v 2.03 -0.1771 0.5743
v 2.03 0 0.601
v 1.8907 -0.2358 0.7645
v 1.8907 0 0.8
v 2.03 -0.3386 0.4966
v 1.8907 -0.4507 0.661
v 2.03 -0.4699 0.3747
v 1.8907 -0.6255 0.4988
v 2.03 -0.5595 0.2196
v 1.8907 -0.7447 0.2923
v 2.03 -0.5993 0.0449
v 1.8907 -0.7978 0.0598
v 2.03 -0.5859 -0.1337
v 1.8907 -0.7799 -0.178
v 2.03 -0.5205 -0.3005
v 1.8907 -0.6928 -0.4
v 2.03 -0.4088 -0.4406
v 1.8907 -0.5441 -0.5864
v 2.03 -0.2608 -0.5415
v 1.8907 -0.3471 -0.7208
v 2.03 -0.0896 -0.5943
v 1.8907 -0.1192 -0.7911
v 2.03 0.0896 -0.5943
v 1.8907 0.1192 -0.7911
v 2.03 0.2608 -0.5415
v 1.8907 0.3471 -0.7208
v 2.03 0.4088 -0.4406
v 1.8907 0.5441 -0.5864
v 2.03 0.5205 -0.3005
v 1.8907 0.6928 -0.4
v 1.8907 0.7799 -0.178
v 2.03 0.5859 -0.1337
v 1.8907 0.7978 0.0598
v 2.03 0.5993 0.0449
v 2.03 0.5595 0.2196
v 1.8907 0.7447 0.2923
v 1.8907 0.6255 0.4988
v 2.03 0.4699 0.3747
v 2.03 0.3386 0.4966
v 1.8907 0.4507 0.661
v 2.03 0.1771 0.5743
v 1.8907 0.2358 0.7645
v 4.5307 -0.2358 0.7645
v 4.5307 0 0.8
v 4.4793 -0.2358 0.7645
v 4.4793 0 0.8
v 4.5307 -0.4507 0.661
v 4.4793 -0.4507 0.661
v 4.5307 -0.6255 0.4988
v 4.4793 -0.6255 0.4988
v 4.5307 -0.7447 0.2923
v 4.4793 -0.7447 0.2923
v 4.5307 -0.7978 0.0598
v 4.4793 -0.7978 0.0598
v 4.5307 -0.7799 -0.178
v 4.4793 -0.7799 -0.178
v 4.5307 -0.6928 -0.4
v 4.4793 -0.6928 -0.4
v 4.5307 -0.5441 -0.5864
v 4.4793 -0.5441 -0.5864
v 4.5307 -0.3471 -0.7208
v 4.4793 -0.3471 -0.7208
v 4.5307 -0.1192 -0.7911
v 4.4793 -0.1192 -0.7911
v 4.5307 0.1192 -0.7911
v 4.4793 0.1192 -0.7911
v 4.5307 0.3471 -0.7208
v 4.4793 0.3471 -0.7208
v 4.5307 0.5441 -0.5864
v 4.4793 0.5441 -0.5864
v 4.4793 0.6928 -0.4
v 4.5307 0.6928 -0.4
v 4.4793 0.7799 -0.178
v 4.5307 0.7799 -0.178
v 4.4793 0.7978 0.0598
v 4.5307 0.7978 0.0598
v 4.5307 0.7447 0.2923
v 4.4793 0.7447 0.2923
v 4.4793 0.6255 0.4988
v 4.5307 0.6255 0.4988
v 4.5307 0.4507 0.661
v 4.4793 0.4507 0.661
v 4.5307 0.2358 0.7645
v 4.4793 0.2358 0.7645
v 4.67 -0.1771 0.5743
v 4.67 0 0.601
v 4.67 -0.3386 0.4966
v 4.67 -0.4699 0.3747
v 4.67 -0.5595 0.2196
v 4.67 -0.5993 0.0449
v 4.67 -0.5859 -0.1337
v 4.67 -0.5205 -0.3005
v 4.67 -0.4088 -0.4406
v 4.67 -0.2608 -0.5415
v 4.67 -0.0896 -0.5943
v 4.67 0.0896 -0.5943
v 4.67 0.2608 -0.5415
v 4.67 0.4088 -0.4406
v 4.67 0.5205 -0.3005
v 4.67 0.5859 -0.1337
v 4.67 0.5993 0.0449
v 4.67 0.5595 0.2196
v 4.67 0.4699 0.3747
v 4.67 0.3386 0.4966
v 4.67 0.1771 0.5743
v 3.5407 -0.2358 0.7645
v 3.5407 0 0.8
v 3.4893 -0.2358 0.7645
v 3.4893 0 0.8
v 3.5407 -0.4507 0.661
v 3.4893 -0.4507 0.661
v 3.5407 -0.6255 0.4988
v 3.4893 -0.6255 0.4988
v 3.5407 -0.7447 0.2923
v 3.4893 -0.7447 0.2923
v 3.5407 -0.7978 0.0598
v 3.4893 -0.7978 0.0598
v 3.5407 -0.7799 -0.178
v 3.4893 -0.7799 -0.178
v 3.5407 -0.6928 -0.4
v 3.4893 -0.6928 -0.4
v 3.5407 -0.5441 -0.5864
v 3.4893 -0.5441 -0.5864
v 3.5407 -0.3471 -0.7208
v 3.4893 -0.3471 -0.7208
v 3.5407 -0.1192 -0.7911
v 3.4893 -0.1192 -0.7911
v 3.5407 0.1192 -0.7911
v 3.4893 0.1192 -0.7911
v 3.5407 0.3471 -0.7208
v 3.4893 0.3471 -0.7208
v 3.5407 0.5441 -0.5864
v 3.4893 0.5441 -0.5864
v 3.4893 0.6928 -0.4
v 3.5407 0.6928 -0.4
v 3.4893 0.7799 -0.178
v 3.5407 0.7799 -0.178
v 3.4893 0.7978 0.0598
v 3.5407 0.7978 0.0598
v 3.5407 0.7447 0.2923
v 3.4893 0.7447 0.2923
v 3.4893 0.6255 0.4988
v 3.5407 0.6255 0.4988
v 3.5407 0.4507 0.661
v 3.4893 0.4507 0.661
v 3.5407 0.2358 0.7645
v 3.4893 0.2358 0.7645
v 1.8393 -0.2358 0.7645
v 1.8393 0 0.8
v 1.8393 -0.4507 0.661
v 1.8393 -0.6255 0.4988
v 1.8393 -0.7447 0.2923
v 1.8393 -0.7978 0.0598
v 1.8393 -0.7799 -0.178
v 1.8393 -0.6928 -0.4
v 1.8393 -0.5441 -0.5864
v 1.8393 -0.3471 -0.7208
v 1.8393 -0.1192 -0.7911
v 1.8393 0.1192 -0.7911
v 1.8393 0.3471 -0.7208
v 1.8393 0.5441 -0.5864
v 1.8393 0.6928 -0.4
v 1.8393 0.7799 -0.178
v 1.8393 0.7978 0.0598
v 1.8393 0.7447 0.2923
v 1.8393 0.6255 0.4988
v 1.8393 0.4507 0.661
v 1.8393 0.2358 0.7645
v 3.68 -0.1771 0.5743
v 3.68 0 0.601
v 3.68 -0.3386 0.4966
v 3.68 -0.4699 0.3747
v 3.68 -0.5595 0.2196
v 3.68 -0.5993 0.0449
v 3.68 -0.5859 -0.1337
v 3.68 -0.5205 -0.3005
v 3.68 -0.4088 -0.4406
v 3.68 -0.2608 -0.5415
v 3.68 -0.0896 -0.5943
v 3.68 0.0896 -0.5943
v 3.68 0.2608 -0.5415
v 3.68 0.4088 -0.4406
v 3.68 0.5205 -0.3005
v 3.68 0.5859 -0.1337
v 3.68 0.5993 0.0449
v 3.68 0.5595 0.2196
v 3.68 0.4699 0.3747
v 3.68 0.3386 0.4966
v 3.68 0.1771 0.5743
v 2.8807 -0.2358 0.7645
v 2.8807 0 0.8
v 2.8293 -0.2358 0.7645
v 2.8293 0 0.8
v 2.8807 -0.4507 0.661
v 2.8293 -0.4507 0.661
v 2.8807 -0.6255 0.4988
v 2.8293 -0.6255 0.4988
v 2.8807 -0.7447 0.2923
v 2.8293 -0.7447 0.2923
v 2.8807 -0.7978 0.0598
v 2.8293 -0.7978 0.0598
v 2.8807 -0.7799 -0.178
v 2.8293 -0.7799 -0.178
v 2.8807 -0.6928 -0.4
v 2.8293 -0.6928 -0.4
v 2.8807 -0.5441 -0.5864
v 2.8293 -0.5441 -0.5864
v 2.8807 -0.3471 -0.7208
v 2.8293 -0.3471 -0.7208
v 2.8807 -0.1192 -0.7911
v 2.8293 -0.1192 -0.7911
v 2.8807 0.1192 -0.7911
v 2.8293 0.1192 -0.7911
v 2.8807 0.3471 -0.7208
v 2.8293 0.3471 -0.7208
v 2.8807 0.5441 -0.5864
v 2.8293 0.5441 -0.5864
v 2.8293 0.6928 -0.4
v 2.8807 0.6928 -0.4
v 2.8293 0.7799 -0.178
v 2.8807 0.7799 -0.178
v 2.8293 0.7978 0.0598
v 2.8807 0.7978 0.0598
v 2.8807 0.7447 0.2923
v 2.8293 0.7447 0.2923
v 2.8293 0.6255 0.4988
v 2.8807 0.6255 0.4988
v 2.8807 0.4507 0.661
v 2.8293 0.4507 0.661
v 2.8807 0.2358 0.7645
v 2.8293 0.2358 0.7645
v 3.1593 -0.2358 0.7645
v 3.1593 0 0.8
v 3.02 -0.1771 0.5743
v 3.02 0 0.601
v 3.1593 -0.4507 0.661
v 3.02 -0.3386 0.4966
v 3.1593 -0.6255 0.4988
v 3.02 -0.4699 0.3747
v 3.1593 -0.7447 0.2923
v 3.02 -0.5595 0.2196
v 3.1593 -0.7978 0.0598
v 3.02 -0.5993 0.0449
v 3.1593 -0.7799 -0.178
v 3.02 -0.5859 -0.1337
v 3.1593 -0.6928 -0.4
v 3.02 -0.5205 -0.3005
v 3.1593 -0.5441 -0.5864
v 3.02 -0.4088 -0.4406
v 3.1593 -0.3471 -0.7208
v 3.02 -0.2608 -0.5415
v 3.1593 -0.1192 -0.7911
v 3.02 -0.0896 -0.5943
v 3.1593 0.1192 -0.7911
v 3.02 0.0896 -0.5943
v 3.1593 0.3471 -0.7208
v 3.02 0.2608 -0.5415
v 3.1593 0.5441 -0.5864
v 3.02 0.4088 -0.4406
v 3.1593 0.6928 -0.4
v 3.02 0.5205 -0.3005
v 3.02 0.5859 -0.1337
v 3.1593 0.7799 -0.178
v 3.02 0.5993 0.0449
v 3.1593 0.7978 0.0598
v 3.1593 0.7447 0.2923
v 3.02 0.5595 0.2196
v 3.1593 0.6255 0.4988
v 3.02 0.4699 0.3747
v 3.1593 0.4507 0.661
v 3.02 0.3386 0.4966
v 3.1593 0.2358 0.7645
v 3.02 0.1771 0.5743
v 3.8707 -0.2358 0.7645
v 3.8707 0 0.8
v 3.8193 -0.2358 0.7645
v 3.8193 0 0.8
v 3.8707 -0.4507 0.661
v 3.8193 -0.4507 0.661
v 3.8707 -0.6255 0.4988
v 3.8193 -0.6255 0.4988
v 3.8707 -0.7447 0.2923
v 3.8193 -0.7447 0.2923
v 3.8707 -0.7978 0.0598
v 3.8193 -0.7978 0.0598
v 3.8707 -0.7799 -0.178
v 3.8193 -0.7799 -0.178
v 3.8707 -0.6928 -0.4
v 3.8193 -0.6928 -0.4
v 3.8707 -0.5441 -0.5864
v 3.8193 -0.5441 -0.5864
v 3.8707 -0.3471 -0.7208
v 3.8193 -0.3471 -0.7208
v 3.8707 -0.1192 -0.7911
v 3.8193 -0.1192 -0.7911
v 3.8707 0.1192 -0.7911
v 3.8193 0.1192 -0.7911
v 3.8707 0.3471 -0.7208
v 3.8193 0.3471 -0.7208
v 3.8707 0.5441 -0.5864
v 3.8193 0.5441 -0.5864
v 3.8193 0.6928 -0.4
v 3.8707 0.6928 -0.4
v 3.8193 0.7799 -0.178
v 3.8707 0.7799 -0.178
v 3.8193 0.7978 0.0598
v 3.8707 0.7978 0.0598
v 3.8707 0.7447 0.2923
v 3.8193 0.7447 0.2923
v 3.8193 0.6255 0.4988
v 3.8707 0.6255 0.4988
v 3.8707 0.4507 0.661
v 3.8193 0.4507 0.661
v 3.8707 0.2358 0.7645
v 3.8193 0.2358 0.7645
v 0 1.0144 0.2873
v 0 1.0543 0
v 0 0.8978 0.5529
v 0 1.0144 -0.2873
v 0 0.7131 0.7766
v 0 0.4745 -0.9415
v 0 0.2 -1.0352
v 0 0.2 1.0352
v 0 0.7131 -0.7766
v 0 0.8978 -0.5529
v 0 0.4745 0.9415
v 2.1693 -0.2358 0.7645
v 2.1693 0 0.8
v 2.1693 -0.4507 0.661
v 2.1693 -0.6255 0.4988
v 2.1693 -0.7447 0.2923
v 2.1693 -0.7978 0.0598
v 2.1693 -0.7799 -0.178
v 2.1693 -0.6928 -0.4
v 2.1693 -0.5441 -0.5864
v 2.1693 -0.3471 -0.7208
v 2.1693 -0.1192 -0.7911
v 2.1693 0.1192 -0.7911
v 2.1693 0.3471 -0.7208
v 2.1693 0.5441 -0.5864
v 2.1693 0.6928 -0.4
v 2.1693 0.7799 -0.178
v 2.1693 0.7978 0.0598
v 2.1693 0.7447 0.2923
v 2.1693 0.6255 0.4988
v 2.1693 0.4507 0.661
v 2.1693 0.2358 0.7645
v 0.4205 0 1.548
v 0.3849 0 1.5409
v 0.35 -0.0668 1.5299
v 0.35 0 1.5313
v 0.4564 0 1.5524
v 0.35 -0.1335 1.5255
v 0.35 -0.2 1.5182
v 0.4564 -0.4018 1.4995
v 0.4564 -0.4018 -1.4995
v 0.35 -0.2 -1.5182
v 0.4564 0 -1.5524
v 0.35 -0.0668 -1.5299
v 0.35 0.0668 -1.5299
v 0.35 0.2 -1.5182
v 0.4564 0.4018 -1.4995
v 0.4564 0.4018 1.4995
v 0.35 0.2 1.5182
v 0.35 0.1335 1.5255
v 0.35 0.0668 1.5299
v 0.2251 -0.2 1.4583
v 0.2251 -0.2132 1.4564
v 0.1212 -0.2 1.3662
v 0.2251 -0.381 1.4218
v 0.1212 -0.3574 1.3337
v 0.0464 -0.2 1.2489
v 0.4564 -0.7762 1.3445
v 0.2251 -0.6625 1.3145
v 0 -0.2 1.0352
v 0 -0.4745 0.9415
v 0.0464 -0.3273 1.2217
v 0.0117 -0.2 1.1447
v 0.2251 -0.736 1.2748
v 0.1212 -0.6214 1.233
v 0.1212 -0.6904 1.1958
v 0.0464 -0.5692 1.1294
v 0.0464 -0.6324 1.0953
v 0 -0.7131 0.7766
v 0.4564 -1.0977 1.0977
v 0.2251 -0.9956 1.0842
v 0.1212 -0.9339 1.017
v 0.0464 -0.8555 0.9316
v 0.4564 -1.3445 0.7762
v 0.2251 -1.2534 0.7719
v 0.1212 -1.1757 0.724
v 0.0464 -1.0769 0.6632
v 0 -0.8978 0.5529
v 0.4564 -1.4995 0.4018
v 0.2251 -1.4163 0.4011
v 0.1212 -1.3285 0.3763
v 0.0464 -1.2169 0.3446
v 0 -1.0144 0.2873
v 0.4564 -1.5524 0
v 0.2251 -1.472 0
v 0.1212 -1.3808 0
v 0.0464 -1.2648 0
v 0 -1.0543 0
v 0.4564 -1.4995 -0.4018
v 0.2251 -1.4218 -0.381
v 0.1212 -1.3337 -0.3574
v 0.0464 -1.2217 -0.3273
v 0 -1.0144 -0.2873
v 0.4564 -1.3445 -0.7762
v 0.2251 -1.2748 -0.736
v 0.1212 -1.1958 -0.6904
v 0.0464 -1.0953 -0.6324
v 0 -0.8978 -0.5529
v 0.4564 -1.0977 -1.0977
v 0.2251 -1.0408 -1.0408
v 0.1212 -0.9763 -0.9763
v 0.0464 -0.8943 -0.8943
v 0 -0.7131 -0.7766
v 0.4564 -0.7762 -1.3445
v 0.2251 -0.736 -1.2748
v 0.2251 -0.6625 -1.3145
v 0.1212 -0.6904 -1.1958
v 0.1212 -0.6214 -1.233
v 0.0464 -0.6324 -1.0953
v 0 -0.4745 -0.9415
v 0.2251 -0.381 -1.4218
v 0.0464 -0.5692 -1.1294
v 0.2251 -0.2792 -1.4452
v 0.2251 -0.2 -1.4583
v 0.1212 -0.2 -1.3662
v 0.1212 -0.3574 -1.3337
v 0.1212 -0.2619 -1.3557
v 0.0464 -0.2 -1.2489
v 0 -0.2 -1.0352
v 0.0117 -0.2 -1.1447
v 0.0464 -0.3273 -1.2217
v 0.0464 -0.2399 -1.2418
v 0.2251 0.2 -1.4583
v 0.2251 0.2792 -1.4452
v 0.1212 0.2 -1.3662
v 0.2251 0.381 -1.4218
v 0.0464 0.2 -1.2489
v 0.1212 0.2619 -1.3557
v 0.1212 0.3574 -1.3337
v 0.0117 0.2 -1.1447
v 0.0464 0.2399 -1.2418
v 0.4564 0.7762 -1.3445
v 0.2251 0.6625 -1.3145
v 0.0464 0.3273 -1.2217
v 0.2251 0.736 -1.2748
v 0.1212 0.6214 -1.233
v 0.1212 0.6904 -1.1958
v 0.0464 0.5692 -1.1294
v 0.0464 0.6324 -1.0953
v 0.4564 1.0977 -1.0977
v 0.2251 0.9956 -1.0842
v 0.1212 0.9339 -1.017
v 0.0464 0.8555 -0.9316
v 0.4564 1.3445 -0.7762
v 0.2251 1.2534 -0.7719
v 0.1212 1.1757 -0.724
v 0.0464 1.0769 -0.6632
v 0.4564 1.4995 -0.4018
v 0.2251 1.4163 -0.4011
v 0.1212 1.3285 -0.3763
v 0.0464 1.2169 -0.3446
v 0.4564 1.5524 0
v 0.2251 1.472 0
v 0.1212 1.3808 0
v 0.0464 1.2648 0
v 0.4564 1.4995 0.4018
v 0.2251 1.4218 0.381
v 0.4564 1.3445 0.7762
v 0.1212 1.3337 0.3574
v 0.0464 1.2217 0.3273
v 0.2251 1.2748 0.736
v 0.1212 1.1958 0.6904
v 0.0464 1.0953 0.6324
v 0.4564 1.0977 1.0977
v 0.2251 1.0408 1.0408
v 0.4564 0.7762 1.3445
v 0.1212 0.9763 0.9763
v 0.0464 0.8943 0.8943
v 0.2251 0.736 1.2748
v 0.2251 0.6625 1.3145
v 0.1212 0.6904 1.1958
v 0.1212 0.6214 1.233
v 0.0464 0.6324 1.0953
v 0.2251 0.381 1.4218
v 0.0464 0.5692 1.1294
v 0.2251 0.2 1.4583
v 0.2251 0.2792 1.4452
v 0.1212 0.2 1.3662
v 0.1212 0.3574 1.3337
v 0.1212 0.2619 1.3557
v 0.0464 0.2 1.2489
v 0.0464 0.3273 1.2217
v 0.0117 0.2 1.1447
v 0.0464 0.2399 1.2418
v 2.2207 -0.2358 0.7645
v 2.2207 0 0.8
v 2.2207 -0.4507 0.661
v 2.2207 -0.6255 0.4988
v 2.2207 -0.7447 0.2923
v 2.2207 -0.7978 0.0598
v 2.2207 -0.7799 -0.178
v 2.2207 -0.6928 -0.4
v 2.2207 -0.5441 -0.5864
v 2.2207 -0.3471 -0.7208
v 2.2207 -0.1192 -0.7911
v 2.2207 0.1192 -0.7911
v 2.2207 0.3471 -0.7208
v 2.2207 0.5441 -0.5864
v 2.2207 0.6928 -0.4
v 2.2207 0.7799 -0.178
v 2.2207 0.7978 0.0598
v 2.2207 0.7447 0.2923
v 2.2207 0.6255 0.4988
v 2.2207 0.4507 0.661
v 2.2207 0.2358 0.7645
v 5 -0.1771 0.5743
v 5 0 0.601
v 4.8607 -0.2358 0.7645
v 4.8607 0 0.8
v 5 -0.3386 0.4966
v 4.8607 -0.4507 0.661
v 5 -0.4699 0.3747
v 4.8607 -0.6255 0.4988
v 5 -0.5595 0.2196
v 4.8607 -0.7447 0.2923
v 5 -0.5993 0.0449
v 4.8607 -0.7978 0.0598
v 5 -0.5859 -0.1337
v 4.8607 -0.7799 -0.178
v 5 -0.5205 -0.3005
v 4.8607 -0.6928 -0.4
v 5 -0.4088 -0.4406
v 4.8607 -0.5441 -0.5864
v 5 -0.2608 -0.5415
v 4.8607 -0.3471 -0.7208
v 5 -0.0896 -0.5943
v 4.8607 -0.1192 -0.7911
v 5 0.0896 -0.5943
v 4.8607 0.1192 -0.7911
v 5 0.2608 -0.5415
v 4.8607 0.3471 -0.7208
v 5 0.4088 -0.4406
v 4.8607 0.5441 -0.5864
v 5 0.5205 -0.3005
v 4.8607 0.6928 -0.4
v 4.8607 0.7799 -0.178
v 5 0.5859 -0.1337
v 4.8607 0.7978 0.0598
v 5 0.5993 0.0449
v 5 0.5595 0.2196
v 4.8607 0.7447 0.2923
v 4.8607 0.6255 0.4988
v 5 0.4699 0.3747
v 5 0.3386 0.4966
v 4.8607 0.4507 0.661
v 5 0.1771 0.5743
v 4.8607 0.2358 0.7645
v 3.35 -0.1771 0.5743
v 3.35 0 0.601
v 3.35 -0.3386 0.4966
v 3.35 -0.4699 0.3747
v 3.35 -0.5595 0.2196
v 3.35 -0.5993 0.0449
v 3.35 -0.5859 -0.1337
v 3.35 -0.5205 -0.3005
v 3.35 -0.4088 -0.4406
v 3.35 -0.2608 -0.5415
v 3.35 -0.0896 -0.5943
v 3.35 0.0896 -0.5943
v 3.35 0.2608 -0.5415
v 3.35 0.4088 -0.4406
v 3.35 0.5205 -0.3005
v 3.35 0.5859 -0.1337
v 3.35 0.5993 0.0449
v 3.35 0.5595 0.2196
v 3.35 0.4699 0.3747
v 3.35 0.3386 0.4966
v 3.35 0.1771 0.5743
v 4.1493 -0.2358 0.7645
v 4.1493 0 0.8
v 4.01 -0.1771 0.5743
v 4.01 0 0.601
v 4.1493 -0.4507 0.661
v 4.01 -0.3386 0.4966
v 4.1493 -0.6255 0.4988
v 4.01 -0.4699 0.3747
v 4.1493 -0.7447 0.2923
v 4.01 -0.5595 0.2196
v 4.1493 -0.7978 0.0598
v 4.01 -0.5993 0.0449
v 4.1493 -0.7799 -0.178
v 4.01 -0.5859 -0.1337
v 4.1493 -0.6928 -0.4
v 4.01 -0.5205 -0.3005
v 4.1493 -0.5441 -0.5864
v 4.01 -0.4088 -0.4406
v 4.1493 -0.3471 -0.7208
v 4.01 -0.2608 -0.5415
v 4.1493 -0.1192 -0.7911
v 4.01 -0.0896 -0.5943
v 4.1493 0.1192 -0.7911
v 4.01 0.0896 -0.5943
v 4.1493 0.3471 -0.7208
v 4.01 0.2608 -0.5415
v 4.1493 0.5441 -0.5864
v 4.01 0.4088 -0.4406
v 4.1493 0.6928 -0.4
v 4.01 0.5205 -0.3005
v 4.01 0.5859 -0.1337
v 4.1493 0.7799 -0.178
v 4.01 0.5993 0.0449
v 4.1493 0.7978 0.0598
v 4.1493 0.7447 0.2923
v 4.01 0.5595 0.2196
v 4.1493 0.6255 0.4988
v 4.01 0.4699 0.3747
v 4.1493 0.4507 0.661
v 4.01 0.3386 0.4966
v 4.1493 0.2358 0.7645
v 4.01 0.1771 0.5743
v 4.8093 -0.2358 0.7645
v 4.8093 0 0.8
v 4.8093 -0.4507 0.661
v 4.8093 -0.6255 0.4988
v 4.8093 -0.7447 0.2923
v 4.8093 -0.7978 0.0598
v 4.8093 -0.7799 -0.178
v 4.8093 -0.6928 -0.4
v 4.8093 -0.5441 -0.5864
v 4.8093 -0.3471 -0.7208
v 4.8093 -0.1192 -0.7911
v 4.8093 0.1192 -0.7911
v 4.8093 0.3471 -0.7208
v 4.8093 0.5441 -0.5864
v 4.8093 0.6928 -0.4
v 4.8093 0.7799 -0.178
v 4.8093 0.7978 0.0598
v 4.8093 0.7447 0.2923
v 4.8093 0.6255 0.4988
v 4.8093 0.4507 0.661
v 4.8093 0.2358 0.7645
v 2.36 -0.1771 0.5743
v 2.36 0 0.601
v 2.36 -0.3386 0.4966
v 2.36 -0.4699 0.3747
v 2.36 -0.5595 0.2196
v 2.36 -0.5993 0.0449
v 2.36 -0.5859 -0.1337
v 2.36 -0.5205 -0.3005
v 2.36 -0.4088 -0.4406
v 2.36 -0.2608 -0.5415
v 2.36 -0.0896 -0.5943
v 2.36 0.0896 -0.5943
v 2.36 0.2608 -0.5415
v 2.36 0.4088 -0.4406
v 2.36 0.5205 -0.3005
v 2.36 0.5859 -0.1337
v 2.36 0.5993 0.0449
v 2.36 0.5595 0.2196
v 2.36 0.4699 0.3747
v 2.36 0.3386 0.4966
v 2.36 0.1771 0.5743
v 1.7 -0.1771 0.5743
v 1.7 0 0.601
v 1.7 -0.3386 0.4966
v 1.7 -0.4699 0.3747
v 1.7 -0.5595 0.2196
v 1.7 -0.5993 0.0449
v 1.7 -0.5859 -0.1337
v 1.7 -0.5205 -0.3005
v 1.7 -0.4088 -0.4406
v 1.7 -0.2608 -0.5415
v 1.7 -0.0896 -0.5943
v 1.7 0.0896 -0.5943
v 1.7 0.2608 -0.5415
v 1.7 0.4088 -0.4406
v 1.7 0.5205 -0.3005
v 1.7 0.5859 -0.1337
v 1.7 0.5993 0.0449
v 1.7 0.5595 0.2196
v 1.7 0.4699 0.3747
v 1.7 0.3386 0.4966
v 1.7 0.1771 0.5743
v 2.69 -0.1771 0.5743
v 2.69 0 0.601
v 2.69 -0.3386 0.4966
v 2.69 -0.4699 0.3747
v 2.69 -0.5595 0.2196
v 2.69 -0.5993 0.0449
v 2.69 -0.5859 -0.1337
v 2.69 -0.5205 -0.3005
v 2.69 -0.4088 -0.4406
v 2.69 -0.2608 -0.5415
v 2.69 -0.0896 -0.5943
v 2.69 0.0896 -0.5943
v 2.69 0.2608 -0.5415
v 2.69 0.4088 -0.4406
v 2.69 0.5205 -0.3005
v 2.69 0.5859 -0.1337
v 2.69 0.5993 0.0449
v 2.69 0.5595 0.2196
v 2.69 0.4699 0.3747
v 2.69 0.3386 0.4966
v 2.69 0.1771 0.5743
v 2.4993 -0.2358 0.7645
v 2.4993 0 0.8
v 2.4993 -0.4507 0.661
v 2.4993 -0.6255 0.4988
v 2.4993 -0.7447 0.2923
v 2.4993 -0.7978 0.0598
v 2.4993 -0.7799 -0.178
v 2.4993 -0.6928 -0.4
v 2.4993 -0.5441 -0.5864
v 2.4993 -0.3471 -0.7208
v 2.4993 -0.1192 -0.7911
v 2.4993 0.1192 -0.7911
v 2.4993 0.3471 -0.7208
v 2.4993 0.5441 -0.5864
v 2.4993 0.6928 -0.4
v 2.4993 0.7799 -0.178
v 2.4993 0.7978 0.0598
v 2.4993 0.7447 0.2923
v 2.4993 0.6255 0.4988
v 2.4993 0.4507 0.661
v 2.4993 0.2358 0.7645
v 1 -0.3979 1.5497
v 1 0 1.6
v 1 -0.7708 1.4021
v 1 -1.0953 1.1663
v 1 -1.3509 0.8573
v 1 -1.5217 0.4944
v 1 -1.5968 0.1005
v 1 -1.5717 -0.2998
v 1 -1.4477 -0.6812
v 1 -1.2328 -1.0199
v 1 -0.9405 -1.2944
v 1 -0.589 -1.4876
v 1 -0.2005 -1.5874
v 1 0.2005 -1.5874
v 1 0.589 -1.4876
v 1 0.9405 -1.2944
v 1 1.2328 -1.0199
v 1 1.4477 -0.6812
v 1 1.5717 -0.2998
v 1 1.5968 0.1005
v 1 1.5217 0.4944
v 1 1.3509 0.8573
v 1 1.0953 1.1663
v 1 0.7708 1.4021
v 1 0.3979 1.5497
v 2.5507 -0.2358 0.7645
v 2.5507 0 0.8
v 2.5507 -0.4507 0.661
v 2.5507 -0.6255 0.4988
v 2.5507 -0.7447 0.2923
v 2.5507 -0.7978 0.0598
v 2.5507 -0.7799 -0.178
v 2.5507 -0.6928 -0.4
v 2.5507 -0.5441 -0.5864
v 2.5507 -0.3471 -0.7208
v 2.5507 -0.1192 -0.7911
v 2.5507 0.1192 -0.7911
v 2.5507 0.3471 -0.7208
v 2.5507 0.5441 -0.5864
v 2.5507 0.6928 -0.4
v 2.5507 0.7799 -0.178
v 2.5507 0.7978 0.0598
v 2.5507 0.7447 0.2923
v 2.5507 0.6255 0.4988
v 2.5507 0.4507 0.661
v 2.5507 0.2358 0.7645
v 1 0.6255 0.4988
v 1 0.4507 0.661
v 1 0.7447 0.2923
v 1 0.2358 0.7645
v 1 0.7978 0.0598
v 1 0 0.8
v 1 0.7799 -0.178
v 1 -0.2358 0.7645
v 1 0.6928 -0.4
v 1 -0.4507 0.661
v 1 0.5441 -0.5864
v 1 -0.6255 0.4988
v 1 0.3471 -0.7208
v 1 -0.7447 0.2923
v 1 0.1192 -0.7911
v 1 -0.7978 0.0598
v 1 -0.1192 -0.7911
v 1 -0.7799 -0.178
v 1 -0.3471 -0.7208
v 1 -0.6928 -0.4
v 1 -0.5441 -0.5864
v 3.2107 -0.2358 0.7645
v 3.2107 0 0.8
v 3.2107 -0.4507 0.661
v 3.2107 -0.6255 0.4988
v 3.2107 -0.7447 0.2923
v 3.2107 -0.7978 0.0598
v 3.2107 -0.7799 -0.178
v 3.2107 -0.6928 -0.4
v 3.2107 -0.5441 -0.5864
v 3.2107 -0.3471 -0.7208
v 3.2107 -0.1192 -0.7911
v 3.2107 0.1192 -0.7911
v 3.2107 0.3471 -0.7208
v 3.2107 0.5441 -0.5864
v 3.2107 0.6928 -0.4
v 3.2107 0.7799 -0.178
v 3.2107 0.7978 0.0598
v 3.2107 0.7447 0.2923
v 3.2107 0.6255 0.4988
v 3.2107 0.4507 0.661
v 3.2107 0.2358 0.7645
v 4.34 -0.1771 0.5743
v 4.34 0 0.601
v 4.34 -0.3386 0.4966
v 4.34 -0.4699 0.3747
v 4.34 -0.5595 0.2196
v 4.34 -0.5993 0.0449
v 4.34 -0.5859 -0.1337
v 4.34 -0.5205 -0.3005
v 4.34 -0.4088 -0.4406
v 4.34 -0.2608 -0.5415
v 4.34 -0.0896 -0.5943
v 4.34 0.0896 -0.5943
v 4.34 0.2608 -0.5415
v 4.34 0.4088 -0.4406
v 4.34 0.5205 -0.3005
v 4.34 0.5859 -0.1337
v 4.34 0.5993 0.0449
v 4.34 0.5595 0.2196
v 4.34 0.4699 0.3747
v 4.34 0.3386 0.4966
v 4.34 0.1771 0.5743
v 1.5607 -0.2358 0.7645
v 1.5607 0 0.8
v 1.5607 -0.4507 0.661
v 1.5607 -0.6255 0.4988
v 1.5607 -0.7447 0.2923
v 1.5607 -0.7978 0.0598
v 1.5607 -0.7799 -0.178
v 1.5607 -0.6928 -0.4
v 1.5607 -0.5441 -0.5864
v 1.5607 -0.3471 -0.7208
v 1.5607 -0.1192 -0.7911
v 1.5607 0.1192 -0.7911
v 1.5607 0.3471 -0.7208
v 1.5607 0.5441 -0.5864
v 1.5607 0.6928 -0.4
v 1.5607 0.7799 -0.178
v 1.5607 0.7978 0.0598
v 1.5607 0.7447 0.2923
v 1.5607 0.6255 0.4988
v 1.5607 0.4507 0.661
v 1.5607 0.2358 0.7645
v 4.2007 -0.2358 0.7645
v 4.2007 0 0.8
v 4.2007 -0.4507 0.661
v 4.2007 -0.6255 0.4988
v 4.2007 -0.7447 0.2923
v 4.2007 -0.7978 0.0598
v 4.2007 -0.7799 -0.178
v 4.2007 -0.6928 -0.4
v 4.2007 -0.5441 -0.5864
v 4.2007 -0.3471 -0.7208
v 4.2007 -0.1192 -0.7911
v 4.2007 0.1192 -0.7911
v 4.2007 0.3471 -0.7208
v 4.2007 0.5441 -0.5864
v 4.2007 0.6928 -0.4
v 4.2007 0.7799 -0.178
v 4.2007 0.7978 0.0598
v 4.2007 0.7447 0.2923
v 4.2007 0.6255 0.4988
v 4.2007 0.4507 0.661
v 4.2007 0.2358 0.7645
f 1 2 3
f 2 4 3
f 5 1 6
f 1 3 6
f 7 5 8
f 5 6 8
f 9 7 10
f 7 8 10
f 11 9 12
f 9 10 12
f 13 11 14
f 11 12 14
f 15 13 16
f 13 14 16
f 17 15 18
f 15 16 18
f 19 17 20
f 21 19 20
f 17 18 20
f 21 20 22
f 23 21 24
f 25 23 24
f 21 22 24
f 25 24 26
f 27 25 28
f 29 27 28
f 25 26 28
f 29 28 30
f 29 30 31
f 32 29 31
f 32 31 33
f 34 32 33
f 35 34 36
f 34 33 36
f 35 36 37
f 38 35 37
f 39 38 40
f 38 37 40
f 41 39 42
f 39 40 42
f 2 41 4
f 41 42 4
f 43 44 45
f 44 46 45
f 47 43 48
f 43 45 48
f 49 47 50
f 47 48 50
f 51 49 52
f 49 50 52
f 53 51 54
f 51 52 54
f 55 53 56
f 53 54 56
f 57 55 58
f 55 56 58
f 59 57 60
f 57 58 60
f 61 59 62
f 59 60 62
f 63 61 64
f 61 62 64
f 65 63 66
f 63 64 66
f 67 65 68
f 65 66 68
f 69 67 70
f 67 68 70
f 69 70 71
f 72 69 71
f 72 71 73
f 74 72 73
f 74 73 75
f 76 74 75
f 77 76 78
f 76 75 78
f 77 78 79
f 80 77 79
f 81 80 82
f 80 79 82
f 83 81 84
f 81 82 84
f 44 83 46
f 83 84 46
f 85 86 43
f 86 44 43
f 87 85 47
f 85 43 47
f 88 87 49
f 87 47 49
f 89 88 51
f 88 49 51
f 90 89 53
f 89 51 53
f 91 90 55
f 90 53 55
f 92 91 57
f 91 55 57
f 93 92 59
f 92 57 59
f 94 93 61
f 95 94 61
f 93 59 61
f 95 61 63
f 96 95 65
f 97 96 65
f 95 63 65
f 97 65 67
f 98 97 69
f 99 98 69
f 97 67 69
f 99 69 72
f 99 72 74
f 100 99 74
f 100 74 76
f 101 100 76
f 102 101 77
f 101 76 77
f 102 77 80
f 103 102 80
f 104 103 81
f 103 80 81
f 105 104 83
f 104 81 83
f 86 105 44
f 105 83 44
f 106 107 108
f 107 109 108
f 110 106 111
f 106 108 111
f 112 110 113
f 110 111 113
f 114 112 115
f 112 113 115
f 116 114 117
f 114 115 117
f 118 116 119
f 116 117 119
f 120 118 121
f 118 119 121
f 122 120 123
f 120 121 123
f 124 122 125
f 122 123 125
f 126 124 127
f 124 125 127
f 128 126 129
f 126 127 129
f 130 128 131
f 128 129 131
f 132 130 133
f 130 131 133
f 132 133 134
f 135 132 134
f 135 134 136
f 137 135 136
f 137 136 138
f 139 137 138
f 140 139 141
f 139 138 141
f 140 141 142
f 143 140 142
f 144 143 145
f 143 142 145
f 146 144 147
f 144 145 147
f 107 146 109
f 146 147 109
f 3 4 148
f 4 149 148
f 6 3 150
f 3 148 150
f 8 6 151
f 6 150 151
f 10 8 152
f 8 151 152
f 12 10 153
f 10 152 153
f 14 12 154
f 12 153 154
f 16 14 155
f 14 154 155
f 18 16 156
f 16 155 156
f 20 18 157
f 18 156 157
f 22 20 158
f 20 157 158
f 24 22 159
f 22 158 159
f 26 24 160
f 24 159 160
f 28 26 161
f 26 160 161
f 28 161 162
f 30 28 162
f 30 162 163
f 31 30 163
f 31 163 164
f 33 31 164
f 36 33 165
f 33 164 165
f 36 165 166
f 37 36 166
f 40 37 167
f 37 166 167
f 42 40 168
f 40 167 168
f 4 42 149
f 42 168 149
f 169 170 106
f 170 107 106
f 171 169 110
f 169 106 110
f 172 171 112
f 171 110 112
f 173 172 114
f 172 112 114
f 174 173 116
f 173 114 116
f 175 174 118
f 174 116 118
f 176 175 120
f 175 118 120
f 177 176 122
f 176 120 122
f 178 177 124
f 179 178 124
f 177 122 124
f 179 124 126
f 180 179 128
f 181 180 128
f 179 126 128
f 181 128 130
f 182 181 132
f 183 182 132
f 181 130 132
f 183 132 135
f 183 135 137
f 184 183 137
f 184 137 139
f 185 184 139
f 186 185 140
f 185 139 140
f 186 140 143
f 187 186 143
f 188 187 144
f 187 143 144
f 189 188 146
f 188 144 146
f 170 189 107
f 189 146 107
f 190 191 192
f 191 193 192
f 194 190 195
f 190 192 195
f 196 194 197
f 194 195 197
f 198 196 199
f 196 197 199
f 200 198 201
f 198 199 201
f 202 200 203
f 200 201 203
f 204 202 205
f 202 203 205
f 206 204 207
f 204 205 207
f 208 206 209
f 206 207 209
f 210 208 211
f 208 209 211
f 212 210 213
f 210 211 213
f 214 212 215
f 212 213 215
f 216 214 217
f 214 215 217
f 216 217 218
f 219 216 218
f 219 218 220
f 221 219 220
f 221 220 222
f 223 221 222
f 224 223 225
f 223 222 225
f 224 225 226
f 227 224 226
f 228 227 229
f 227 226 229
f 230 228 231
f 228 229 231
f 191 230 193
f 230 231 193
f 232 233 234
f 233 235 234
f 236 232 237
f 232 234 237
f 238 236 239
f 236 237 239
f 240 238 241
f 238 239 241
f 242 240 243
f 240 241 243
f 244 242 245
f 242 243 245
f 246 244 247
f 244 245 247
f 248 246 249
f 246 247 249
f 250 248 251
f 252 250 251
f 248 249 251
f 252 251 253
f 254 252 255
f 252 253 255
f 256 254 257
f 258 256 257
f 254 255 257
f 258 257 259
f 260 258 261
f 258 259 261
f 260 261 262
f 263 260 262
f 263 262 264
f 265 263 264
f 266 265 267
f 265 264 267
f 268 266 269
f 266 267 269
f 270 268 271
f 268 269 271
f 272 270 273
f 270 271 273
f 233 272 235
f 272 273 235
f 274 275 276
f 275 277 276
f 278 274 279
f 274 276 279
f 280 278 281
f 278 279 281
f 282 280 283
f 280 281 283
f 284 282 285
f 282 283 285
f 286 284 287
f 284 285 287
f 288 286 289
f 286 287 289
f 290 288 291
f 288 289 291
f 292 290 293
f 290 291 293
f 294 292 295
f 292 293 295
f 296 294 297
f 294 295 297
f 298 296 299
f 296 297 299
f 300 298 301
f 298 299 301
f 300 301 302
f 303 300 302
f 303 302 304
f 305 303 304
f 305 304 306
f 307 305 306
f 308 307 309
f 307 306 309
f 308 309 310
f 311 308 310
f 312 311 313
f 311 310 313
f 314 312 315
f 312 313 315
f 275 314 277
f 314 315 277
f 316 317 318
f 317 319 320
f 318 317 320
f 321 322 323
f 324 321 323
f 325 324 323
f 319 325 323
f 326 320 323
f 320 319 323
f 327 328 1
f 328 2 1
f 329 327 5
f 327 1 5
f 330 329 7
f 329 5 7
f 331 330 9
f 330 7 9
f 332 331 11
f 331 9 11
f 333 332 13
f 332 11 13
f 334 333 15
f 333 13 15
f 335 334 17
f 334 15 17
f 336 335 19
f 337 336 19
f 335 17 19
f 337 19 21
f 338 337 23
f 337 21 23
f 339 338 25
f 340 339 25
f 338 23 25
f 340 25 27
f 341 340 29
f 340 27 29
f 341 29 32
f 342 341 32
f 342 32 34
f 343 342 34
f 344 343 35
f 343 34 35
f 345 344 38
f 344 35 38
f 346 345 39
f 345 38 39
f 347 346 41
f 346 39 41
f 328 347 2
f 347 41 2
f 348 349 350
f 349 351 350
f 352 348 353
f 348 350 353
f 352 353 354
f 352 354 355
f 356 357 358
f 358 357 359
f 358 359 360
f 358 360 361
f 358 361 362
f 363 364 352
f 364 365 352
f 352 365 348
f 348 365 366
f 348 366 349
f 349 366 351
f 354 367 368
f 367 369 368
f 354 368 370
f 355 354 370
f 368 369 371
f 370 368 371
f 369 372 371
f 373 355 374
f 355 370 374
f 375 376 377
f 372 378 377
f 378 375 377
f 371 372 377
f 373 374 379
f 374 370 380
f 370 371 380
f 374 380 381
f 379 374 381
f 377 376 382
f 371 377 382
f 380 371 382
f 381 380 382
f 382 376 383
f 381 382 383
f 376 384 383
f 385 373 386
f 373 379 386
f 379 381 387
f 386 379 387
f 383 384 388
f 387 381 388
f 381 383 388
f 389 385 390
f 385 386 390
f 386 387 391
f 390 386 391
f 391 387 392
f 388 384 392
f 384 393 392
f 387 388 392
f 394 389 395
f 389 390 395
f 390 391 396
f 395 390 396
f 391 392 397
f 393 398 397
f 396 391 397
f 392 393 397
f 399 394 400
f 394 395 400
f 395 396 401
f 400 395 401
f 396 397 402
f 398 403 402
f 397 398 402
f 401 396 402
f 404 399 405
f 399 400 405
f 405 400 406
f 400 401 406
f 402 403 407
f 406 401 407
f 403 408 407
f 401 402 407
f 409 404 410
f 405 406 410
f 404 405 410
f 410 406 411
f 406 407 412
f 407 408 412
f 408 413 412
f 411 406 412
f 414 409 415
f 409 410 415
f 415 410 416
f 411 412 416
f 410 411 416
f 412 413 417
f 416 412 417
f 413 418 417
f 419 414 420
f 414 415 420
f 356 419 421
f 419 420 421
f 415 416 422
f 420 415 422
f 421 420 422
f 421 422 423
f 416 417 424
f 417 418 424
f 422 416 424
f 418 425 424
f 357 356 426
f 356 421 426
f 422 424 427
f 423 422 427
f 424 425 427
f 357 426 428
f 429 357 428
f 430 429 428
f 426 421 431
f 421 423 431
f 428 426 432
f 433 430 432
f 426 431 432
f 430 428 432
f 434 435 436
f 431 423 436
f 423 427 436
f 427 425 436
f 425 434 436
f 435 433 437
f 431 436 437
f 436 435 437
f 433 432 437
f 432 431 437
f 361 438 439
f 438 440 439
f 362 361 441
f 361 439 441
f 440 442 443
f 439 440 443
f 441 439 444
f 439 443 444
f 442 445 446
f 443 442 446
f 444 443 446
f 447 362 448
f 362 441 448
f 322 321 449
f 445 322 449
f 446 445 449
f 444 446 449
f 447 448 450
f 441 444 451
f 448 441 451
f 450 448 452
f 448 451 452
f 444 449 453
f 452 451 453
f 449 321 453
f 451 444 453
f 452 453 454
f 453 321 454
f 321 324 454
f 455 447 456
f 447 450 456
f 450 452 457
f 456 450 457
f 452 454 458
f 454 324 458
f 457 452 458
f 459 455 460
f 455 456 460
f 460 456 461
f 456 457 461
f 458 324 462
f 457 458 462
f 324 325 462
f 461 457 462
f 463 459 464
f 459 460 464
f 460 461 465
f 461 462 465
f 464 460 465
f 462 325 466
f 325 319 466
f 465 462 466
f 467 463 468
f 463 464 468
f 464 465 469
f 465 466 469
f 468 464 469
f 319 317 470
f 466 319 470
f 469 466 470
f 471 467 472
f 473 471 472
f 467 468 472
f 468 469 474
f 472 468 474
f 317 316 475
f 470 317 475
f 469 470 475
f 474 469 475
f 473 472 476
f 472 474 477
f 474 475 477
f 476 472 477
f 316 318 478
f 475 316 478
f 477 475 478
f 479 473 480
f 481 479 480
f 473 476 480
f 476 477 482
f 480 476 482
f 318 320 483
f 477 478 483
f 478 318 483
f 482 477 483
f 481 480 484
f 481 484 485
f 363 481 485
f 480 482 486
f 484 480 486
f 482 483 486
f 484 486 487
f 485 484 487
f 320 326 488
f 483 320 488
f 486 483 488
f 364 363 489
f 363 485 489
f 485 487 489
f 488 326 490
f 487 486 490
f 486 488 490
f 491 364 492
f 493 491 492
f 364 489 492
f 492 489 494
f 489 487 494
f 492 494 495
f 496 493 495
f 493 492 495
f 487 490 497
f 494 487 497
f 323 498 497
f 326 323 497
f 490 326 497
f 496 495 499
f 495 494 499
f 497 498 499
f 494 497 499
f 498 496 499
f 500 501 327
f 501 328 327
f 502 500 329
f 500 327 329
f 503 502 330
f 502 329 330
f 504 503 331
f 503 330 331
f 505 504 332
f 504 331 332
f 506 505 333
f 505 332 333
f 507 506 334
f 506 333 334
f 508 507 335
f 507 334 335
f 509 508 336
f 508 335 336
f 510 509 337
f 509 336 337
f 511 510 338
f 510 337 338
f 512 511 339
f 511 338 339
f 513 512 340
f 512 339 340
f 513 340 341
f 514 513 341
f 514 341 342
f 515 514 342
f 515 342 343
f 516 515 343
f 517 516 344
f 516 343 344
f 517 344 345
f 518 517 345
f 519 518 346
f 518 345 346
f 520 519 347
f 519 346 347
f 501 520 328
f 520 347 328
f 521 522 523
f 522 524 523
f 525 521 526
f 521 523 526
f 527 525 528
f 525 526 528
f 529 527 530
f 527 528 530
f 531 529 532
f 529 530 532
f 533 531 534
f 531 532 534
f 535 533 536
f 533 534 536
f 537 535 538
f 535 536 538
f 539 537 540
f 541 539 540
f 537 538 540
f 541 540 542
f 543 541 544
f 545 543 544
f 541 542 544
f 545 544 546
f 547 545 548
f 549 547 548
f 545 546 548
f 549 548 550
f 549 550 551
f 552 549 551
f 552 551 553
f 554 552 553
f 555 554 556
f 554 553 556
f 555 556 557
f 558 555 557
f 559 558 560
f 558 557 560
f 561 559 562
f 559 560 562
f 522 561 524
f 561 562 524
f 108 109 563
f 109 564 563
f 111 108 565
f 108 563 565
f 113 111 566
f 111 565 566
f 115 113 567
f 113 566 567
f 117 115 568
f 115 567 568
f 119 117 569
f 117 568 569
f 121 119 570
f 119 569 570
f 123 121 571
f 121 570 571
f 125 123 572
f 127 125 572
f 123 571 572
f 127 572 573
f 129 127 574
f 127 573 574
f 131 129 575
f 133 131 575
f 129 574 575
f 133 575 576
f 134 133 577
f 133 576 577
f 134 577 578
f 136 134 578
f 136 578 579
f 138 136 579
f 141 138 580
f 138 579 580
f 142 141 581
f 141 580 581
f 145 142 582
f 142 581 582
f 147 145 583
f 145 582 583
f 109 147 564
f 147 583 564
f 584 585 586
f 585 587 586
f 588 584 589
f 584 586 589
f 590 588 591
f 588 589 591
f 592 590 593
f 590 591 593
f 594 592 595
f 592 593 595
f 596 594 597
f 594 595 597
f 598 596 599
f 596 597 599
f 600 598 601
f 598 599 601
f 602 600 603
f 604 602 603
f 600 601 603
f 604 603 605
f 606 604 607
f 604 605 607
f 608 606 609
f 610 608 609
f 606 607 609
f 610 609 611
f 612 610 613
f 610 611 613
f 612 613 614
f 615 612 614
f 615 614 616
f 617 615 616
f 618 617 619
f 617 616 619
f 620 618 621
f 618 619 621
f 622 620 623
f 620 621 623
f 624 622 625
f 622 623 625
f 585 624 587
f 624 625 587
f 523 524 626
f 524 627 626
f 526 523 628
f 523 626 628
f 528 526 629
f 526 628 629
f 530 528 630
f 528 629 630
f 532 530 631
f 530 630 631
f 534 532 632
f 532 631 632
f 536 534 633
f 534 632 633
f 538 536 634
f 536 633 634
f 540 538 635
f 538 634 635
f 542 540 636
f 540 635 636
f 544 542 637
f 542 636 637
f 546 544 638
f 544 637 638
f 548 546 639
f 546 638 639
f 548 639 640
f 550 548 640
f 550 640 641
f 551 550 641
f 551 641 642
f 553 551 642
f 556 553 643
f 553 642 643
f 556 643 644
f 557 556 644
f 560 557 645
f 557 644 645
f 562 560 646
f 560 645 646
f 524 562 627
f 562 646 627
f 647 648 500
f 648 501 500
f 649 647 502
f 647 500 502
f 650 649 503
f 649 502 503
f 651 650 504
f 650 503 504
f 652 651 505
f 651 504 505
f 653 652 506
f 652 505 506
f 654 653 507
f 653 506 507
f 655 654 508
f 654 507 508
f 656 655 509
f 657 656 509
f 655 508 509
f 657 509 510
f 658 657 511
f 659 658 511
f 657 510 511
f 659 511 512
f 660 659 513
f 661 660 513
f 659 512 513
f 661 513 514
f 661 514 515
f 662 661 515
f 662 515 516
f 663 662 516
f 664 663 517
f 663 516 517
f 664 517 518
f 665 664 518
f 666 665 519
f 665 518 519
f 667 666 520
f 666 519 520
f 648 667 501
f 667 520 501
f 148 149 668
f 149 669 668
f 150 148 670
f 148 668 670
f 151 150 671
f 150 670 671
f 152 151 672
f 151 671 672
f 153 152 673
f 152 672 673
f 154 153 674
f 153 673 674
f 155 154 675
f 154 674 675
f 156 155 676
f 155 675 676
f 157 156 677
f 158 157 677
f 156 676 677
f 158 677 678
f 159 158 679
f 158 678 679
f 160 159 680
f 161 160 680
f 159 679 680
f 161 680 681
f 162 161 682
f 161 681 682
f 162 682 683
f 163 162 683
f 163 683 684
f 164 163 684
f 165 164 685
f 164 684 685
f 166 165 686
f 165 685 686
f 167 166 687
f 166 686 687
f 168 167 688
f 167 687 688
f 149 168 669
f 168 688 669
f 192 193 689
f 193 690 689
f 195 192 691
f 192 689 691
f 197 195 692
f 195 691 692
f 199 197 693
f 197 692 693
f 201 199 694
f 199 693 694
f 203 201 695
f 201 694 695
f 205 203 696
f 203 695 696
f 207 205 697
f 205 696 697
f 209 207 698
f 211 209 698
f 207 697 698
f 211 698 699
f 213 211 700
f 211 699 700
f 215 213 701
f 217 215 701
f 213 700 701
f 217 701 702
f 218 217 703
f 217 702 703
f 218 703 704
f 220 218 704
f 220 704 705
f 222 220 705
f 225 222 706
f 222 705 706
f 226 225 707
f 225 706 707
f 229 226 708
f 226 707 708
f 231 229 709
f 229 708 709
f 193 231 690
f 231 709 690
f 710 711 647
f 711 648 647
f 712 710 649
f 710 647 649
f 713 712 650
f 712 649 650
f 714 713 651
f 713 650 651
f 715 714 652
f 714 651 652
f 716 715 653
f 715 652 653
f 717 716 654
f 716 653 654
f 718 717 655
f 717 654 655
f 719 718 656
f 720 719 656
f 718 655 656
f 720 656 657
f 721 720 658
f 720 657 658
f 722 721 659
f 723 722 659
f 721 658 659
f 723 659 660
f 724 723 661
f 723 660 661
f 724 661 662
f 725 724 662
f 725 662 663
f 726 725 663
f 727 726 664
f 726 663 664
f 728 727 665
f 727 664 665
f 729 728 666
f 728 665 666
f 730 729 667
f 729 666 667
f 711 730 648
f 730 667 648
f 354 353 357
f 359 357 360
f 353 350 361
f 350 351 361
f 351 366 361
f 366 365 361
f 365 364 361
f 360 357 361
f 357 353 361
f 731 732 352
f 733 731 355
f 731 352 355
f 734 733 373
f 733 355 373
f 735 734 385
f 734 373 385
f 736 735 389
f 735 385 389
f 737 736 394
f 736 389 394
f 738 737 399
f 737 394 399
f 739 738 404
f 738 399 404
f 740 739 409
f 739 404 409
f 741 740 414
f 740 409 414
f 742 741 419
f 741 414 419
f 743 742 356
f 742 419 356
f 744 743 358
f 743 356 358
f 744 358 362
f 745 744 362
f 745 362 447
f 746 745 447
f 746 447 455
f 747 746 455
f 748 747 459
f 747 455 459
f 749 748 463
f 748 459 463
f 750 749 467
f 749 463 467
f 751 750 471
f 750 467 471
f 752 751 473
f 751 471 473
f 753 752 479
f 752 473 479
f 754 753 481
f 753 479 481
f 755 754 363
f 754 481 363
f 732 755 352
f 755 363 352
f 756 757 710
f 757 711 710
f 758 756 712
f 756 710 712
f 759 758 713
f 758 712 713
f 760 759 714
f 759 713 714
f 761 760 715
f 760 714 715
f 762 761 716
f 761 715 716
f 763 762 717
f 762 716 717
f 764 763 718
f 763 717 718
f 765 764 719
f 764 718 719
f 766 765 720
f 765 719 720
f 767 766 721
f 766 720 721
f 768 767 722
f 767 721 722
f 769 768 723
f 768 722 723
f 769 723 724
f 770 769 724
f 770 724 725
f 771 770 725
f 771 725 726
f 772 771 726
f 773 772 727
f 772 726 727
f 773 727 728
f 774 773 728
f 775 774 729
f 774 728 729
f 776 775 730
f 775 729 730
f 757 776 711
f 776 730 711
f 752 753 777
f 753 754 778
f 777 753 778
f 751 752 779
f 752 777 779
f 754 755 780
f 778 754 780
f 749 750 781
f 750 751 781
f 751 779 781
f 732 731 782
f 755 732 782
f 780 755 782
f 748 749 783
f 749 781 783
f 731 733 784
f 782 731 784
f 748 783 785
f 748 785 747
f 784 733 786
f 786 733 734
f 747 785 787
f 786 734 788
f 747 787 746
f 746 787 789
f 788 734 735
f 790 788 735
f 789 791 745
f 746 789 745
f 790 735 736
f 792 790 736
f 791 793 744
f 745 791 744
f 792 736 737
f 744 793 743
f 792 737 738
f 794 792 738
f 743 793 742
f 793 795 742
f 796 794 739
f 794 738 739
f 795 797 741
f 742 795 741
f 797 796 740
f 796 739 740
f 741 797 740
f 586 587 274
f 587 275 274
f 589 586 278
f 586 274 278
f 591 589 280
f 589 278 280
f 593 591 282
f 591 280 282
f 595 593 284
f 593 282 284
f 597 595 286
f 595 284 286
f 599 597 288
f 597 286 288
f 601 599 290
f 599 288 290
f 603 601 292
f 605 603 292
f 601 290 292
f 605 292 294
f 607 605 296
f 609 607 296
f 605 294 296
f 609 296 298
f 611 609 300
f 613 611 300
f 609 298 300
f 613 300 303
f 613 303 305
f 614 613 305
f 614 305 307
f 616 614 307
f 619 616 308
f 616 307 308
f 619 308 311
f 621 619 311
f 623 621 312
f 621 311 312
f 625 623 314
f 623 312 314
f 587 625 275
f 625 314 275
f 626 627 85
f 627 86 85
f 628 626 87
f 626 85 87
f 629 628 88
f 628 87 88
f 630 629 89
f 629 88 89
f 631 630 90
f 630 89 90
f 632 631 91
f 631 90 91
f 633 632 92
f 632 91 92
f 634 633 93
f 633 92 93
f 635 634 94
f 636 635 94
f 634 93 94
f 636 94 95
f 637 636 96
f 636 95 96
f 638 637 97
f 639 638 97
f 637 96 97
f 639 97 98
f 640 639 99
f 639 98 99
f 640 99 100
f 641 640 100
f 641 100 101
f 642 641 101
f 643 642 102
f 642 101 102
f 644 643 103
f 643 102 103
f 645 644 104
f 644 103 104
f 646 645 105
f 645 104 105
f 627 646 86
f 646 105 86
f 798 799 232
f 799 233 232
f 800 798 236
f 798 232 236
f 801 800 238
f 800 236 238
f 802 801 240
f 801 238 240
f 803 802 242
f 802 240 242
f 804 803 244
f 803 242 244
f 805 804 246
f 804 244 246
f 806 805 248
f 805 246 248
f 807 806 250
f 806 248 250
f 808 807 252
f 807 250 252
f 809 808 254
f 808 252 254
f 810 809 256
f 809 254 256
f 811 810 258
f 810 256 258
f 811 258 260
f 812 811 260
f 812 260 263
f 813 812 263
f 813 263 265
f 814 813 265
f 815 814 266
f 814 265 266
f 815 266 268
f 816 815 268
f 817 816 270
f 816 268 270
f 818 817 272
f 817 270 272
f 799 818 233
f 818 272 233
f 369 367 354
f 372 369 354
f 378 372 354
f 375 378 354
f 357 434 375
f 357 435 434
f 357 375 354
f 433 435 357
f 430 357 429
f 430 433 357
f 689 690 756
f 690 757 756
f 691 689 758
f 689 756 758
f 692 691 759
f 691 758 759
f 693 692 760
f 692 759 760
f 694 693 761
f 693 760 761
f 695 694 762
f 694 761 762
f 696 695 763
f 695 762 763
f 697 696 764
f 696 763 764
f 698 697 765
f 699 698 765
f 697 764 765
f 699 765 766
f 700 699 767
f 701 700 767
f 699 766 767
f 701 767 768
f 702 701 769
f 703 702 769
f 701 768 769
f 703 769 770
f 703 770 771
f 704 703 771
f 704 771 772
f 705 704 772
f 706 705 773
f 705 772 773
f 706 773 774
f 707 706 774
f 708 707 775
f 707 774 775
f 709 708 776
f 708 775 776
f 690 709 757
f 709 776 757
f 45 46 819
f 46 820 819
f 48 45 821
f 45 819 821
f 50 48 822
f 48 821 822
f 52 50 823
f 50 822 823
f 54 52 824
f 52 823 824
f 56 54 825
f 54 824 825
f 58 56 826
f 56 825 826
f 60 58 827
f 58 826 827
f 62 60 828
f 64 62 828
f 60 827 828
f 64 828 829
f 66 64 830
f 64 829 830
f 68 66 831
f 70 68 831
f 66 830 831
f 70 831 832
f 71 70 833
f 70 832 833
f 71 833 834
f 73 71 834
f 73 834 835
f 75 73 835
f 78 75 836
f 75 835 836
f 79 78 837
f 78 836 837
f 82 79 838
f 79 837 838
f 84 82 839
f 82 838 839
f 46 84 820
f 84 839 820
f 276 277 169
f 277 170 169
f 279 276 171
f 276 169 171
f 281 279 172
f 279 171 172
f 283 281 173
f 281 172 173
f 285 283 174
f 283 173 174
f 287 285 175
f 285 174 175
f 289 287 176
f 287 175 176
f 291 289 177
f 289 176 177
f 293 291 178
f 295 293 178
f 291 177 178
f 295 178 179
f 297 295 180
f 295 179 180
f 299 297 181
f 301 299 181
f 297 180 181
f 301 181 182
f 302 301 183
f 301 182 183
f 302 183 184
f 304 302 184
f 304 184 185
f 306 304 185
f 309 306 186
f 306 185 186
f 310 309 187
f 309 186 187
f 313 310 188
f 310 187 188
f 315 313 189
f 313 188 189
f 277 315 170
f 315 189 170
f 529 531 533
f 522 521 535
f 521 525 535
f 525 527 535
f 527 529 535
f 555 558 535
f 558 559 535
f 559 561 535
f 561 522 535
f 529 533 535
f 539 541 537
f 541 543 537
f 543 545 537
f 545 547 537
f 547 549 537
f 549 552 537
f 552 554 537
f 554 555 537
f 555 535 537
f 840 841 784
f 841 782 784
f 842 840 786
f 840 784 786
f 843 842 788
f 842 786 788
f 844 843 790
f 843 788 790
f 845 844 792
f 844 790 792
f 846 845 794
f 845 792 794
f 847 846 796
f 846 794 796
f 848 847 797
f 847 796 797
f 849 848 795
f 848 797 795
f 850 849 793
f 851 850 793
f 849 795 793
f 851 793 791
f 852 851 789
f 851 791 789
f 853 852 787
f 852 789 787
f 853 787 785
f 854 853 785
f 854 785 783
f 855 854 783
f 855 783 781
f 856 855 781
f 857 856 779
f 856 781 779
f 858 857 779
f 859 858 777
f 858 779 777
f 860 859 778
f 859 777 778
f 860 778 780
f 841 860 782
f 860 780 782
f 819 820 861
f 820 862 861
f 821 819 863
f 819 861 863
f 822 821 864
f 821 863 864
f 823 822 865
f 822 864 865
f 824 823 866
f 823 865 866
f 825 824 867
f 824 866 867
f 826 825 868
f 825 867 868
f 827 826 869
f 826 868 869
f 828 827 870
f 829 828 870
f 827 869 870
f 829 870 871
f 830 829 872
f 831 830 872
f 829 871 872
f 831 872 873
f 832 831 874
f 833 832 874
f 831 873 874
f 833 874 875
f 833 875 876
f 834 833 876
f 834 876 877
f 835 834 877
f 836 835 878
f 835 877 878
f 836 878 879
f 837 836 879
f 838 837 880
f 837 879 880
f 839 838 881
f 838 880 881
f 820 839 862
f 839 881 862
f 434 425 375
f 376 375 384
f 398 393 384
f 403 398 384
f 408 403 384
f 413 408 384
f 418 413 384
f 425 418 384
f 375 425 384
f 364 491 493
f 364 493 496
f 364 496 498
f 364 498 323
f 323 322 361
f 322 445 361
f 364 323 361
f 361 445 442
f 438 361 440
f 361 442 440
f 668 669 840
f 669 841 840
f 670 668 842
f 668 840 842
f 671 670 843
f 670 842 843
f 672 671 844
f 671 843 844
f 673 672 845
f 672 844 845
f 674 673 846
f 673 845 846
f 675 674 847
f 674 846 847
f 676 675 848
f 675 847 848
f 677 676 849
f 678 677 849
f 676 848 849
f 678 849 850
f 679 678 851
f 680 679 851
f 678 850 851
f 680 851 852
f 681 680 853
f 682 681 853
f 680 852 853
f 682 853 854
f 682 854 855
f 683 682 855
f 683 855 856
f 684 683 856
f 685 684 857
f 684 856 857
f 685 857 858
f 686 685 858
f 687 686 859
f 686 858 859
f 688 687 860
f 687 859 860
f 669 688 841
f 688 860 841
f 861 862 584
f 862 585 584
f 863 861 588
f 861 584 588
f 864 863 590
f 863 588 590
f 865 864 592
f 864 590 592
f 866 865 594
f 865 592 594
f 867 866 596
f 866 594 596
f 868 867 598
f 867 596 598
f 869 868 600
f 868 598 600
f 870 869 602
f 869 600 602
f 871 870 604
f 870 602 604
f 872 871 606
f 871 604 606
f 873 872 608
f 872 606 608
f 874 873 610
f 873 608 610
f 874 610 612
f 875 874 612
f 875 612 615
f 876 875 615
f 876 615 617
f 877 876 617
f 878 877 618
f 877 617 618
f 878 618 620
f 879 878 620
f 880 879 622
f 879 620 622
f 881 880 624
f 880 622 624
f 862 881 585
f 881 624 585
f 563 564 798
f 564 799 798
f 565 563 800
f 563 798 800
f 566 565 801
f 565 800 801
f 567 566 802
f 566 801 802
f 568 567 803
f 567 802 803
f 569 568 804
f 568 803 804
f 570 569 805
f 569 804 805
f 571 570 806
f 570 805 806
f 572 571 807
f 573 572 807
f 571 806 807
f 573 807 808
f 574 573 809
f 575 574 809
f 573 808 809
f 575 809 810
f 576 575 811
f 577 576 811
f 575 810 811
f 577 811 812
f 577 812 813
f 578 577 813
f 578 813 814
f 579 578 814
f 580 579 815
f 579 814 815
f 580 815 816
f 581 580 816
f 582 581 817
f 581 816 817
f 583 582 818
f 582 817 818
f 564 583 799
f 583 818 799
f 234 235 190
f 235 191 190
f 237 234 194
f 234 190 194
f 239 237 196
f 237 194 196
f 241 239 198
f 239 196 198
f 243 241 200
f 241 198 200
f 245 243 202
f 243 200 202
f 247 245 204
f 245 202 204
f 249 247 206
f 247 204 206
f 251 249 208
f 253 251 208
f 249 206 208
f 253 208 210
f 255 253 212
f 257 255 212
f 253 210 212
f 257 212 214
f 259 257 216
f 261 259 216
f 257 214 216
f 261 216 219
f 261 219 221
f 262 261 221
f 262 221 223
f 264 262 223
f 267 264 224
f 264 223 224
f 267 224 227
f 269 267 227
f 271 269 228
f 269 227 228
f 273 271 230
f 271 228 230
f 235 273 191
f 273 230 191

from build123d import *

# Parameters (mm, degrees)
FILLET2_R       = 0.5
SKETCH2_W       = 3.2
SKETCH2_H       = 0.4
SLOT_DEPTH      = 0.35
THDSCHPAT_COUNT = 11
THDSCHPAT_PITCH = 0.33


with BuildPart() as part:
    # BodySke → Base-Revolve (revolve)
    with BuildSketch(Plane.XY, mode=Mode.PRIVATE) as base_revolve_sk:
        Polygon((1, 0.8), (1, 1.6), (0, 1.512511336), (0, 0), (5, 0), (5, 0.8), align=None)
    revolve(base_revolve_sk.sketch.rotate(Axis((-25.4, 0, 0), (1, 0, 0)), 90), axis=Axis((-25.4, 0, 0), (1, 0, 0)))

    # Fillet2
    fillet2_edges = [part.edges().sort_by_distance(p)[0] for p in [
        (0, 0, -1.512511336),
    ]]
    fillet(fillet2_edges, radius=FILLET2_R)

    # Sketch2 → Slot (cut)
    with BuildSketch(Plane(origin=(0, 0, 0), x_dir=(0, 0, -1), z_dir=(1, 0, 0))):
        Rectangle(SKETCH2_W, SKETCH2_H)
    extrude(amount=SLOT_DEPTH, mode=Mode.SUBTRACT)

    # ThdSchSke → ThreadSchematic (revolve, cut)
    with BuildSketch(Plane.XY, mode=Mode.PRIVATE) as threadschematic_sk:
        Polygon((1.7, -0.601), (1.5606587, -0.8), (1.5606587, -1), (1.8393413, -1), (1.8393413, -0.8), align=None)
    threadschematic = revolve(threadschematic_sk.sketch.rotate(Axis((-3.175, 0, 0), (1, 0, 0)), 270), axis=Axis((-3.175, 0, 0), (1, 0, 0)), mode=Mode.SUBTRACT)

    # ThdSchPat: ThreadSchematic ×11
    with Locations(*[(i * THDSCHPAT_PITCH, 0, 0) for i in range(1, THDSCHPAT_COUNT)]):
        add(threadschematic, mode=Mode.SUBTRACT)


solid = part.part
